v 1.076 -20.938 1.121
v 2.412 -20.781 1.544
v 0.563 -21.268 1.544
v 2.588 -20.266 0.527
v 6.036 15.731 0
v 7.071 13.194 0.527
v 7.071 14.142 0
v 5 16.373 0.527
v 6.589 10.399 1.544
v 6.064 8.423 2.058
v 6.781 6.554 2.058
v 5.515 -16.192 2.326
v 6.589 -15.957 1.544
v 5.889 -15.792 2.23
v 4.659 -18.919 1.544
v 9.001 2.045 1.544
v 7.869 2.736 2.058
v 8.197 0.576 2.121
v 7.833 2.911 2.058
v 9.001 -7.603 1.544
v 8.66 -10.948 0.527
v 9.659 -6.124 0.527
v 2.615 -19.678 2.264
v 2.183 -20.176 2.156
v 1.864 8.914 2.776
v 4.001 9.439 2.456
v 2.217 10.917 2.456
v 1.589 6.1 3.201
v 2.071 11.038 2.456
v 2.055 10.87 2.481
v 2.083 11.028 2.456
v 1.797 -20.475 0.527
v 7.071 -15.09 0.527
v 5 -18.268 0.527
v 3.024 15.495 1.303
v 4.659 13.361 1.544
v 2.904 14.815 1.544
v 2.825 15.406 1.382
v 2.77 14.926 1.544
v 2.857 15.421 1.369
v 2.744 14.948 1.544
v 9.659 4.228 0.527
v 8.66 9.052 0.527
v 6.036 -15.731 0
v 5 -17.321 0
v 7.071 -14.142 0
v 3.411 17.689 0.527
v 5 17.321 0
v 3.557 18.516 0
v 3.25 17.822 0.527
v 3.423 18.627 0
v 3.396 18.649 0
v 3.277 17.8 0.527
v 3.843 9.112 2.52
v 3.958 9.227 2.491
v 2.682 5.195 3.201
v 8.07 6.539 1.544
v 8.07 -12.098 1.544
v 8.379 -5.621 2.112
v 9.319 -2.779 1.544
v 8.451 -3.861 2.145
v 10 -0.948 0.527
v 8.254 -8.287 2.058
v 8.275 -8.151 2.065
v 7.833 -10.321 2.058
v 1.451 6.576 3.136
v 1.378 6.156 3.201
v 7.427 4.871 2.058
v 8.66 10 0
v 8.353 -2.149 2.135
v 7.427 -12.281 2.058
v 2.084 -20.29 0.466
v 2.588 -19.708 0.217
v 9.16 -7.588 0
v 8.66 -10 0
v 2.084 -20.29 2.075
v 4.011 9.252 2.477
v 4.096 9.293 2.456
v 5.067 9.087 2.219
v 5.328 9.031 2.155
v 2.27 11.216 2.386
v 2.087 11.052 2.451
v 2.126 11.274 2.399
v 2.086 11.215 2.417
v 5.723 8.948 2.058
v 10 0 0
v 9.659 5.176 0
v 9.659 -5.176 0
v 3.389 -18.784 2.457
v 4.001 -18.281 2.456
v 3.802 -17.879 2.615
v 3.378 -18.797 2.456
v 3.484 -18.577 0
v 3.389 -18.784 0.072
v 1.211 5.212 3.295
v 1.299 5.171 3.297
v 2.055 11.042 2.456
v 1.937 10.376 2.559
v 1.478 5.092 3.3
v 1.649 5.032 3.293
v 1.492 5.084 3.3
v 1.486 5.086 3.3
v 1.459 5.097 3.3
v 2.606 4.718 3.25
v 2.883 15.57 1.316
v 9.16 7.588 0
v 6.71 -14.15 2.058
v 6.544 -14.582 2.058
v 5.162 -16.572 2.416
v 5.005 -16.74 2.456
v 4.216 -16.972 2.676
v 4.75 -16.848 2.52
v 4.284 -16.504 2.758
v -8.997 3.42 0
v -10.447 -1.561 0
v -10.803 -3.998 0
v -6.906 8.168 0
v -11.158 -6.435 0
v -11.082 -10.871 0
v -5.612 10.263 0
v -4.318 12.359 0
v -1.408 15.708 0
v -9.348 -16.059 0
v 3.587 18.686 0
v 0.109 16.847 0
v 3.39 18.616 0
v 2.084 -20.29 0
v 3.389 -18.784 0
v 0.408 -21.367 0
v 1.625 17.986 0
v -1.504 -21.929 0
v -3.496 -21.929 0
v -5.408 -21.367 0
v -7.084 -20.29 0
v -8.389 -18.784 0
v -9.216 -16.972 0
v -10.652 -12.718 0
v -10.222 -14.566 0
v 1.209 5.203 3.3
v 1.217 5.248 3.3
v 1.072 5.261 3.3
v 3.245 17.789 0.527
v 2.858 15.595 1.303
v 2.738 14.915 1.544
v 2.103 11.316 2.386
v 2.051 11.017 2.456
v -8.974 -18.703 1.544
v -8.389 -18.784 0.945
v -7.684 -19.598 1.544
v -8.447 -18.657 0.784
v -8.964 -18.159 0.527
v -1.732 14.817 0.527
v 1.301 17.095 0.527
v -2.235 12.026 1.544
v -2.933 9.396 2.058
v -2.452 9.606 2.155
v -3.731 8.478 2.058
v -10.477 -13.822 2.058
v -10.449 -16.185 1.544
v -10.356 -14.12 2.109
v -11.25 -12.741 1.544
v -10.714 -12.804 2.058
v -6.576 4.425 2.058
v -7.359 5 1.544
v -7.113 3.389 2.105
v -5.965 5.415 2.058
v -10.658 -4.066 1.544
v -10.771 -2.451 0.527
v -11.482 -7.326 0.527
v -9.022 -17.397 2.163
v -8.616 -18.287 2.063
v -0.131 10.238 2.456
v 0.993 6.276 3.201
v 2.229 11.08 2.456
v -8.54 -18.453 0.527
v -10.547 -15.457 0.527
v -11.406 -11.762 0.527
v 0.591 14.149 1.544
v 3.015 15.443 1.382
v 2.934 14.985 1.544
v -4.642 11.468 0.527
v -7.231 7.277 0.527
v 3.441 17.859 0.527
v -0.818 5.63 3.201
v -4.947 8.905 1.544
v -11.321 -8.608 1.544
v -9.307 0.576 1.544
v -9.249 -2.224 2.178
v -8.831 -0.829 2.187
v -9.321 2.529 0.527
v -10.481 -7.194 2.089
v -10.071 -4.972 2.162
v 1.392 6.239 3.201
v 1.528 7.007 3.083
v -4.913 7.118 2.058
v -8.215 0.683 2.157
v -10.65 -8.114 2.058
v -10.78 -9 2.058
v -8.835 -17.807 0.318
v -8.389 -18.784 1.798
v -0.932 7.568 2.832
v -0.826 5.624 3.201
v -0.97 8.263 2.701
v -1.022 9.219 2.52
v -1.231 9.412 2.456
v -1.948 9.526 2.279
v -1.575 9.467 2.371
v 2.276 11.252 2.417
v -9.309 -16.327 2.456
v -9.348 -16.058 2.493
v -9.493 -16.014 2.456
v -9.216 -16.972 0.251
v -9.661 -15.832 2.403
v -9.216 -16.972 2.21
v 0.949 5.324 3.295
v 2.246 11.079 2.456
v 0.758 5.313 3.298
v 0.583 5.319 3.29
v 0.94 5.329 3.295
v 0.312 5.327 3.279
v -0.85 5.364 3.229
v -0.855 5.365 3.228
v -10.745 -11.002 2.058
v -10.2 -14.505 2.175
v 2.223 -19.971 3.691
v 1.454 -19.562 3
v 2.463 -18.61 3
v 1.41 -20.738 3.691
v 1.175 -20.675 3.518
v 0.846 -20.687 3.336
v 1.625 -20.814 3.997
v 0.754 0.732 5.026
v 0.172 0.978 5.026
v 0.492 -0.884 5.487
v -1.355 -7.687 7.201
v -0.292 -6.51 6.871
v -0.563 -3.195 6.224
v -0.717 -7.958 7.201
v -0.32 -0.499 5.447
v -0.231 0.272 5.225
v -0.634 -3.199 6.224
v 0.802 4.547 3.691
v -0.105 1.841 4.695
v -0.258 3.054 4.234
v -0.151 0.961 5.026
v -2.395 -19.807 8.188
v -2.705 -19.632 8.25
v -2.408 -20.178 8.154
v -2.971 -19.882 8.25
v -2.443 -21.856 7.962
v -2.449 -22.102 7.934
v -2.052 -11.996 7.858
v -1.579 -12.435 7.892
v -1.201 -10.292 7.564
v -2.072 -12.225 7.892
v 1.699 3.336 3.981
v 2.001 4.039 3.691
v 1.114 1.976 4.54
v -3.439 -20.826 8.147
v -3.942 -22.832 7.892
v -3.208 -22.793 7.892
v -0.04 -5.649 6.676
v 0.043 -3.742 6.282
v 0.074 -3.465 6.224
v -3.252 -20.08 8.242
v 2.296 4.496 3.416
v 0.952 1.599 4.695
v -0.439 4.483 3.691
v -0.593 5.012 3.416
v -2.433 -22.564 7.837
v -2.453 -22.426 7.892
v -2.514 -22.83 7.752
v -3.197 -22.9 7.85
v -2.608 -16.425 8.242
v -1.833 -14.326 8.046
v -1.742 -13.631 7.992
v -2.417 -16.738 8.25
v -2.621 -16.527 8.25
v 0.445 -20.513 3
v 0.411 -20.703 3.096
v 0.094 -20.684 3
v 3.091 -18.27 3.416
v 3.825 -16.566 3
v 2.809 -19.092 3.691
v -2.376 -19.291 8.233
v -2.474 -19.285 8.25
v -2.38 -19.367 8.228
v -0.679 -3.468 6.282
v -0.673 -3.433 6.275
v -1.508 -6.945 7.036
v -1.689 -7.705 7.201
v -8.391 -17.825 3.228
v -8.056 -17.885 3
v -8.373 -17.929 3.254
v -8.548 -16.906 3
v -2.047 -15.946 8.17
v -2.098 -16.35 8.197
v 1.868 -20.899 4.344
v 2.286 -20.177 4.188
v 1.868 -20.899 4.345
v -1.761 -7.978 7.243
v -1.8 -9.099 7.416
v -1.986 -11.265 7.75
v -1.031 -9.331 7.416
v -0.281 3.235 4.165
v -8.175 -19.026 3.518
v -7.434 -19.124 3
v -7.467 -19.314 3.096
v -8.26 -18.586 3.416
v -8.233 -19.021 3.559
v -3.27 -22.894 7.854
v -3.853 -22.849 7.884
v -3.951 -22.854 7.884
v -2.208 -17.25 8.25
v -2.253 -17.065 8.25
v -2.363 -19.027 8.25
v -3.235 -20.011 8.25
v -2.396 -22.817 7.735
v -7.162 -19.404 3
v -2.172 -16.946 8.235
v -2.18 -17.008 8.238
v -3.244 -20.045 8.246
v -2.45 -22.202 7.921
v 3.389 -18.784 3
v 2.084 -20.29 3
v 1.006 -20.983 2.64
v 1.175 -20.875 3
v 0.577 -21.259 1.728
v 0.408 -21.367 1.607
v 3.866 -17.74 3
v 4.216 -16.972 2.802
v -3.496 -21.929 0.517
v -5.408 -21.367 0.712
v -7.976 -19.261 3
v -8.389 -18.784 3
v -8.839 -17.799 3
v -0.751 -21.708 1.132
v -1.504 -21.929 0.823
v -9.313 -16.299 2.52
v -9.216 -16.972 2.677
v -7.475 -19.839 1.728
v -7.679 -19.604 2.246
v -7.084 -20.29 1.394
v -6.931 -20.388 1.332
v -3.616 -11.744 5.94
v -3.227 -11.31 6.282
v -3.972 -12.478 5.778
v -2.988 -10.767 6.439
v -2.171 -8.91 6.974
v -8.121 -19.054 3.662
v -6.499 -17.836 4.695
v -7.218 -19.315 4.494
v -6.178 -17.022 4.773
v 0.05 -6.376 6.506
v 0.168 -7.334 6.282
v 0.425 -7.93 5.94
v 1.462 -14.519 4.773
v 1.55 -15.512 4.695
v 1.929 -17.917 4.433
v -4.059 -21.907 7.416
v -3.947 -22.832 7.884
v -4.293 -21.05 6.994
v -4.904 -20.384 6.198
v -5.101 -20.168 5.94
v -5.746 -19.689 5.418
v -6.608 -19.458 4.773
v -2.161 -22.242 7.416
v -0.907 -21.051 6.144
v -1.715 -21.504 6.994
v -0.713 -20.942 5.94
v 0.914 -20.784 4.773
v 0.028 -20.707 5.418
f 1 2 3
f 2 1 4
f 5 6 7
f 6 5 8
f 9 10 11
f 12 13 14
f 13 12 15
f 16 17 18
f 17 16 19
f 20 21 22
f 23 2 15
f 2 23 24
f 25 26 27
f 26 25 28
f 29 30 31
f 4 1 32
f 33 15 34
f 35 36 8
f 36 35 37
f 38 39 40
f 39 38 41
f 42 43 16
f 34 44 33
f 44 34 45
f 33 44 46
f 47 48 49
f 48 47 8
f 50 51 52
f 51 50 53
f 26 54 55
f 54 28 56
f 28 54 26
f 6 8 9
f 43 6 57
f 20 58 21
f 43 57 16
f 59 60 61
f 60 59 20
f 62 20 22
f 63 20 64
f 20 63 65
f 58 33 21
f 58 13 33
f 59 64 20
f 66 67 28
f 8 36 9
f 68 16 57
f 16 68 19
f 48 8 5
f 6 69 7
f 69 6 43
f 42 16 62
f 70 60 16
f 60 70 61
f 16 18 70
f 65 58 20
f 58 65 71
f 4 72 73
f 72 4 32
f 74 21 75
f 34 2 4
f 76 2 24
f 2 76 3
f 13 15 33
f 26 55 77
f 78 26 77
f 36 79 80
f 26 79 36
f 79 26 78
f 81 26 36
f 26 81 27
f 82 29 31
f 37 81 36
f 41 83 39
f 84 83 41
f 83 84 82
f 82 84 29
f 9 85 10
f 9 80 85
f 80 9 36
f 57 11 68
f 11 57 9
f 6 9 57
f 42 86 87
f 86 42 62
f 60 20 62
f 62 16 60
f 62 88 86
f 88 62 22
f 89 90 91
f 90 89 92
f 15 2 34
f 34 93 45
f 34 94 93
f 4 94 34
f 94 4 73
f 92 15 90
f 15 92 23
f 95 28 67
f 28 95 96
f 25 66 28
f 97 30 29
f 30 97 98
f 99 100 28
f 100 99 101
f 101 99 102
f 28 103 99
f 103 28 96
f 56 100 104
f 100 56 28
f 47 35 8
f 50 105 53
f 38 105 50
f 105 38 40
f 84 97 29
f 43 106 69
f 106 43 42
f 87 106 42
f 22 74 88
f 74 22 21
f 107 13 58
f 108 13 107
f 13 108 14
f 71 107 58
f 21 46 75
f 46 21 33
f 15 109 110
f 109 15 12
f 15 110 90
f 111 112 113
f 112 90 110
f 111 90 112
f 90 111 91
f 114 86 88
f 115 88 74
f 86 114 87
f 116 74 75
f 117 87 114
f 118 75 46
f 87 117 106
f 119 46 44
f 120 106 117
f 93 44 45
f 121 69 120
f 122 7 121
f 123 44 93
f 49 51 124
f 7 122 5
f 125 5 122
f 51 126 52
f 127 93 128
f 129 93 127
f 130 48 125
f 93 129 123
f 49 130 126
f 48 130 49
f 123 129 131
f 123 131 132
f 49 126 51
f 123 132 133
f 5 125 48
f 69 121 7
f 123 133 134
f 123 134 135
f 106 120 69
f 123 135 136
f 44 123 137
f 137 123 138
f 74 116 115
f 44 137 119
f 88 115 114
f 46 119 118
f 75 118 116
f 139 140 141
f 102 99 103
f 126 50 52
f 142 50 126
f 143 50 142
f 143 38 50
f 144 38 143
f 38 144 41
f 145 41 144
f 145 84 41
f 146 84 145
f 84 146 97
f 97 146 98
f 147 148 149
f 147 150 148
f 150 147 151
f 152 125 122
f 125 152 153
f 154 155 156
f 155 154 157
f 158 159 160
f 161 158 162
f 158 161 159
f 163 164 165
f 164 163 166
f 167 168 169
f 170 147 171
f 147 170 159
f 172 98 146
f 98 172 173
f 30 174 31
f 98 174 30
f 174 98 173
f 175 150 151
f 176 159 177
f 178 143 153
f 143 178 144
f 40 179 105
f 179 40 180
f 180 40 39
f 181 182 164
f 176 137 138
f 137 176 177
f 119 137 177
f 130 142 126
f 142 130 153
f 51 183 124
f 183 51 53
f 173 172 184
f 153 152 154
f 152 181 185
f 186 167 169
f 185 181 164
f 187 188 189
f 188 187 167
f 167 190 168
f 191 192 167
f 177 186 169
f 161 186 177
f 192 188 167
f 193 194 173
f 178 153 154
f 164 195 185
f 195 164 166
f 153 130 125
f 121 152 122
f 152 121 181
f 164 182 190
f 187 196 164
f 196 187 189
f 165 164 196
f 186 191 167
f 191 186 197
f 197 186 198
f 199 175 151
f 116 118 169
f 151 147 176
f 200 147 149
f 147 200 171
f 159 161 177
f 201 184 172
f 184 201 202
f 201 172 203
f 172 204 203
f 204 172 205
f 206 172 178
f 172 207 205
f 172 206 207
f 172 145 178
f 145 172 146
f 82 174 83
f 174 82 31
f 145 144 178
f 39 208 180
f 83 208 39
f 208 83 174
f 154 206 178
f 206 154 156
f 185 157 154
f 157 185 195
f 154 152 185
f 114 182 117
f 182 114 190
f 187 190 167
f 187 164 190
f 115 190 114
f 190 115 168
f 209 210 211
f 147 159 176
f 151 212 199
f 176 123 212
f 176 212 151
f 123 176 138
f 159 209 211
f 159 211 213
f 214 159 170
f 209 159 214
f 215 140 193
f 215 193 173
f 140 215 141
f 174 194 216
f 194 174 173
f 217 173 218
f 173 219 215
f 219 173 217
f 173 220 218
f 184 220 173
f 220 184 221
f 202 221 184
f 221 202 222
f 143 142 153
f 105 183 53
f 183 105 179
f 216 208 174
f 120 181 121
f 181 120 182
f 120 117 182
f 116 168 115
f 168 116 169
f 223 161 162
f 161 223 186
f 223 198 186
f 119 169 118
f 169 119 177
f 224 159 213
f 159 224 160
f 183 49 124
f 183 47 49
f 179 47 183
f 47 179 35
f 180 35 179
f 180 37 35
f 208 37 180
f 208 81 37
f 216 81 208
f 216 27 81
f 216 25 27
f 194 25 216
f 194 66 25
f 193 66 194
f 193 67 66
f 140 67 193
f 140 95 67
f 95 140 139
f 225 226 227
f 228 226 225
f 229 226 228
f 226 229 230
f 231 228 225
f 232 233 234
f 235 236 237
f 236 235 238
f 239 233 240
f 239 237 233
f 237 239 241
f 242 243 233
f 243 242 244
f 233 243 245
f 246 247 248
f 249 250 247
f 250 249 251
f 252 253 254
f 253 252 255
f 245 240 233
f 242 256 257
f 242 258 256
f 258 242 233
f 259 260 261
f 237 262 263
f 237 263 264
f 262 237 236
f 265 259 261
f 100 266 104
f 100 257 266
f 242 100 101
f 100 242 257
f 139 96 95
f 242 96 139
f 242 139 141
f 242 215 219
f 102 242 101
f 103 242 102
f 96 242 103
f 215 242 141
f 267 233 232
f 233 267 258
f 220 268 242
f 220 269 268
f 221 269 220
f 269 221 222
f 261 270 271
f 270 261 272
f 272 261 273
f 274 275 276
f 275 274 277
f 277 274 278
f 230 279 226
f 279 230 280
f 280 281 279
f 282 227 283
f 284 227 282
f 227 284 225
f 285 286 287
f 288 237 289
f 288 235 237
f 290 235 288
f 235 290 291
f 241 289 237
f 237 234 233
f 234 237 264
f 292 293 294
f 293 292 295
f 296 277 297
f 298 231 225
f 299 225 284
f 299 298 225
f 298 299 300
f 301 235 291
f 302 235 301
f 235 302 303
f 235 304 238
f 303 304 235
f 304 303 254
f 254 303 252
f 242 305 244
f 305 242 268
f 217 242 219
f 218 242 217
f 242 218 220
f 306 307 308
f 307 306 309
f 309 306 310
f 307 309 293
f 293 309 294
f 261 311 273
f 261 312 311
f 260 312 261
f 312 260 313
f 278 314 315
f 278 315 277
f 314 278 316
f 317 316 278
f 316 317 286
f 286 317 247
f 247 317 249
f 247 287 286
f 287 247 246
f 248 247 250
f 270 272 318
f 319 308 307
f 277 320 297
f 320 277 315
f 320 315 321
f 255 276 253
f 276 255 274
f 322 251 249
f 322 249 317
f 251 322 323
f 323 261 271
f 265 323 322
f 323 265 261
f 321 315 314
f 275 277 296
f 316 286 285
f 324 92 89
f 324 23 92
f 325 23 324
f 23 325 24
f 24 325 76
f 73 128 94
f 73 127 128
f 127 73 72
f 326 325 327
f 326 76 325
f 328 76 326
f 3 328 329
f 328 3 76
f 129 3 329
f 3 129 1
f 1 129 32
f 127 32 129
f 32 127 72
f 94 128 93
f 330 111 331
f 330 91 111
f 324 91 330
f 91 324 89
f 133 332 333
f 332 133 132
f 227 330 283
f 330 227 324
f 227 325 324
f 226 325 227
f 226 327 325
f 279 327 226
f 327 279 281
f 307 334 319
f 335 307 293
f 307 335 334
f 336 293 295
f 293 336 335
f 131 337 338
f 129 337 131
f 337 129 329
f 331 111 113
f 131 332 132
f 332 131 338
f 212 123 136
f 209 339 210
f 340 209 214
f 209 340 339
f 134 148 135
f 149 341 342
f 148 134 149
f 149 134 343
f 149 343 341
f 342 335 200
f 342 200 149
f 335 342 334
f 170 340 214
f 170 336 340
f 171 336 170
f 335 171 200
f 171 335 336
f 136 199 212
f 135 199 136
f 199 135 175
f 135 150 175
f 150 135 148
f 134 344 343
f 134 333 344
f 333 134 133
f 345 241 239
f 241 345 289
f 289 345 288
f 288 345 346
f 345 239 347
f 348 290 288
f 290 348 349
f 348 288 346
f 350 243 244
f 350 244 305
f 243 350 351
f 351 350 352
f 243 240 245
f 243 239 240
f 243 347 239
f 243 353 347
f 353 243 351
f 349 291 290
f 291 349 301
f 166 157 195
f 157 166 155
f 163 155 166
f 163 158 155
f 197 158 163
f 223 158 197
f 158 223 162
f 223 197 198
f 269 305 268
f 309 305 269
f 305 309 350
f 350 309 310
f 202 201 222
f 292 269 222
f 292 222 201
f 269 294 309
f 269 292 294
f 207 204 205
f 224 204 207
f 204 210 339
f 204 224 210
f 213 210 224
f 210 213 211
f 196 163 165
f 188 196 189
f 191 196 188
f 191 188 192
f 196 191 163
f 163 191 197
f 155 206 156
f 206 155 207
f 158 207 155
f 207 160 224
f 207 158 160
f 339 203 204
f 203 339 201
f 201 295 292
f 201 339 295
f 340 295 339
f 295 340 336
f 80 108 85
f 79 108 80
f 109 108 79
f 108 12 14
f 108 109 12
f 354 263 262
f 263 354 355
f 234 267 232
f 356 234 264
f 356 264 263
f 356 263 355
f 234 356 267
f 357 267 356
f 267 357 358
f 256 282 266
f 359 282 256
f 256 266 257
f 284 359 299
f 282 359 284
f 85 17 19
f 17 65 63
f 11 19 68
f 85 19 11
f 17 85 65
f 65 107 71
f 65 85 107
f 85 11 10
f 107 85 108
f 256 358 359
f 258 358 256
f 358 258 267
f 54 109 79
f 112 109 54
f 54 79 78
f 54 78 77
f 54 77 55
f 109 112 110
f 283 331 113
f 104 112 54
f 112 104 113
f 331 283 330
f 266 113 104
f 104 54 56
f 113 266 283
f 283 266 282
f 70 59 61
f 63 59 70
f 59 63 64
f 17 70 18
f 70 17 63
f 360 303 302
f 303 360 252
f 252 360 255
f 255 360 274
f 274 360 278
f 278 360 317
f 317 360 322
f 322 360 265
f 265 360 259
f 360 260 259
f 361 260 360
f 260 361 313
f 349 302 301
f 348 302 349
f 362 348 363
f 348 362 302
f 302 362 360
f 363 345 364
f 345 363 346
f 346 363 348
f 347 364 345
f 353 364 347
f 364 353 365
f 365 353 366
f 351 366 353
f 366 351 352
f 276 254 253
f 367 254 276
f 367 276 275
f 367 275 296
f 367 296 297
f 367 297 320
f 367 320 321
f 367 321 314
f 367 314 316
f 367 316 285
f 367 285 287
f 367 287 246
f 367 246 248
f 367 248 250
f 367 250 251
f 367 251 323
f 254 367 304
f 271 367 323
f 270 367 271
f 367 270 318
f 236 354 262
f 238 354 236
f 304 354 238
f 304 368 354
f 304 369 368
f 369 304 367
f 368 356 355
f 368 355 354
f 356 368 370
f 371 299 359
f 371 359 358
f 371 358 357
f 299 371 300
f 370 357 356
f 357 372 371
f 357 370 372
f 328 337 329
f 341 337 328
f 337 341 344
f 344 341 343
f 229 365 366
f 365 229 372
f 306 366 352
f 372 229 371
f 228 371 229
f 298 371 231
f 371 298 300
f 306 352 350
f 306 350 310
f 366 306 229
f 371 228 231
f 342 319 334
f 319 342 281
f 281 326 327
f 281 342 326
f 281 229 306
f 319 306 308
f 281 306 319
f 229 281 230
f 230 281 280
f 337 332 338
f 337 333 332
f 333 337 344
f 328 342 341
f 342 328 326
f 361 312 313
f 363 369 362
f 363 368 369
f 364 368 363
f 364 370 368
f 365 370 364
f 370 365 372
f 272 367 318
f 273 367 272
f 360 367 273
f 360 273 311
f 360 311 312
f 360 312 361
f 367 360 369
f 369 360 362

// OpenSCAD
module body0() {

   multmatrix(m = [ [1, 0,    0,   0],
                    [0,  1, -1.8,   0],
                    [0,  0,    1, 0],
                    [0,  0,    0,   1] ])
    resize([20,40,8])
       sphere(r=10,center=true,$fn=24);
}
module body() {
difference() {
	body0();

   translate([0,0,-4])
		cube([60,60,8],center=true);
   translate([0,0,7.3])
		cube([60,60,8],center=true);
   translate([-7,0,0])
      rotate([0,0,-10])
        cube([14,60,10],center=true);
  }
}

module top() {
   multmatrix(m = [ [1, 0,    0,   0],
                    [0,  1, -2,   0],
                    [0,  0,    1, 0],
                    [0,  0,    0,   1] ])
    resize([16,28,10.5])
       sphere(r=10,center=true,$fn=24);
}

module scaleblock() {
   rotate([0,0,-10]) translate([0,-8,3]) top();
   translate([-2.5,-15,1.5])
	   cylinder(r=7,h=3,center=true);
   body();
   translate([0.4,0,0]) mirror([1,0,0] ) rotate([0,0,20]) body();
}

difference() {
	scaleblock();
// Lower large cutouts
	translate([-7,0,10])
      rotate([90,0,-18])
         cylinder(r=8,h=60,center=true);
	translate([7,0,10])
      rotate([90,0,2])
         cylinder(r=8,h=60,center=true);
//Upper large cutouts
	translate([-8,0,13])
      rotate([90,0,-10])
         cylinder(r=9.5,h=60,center=true);
	translate([7.5,0,13])
      rotate([90,0,-5])
         cylinder(r=9.5,h=60,center=true);

   translate([0,0,-4]) cube([50,50,8],center=true);
   translate([0,-24.5,4])
     rotate([0,90,-10]) 
       cylinder(r=4,h=40,center=true);
  }
